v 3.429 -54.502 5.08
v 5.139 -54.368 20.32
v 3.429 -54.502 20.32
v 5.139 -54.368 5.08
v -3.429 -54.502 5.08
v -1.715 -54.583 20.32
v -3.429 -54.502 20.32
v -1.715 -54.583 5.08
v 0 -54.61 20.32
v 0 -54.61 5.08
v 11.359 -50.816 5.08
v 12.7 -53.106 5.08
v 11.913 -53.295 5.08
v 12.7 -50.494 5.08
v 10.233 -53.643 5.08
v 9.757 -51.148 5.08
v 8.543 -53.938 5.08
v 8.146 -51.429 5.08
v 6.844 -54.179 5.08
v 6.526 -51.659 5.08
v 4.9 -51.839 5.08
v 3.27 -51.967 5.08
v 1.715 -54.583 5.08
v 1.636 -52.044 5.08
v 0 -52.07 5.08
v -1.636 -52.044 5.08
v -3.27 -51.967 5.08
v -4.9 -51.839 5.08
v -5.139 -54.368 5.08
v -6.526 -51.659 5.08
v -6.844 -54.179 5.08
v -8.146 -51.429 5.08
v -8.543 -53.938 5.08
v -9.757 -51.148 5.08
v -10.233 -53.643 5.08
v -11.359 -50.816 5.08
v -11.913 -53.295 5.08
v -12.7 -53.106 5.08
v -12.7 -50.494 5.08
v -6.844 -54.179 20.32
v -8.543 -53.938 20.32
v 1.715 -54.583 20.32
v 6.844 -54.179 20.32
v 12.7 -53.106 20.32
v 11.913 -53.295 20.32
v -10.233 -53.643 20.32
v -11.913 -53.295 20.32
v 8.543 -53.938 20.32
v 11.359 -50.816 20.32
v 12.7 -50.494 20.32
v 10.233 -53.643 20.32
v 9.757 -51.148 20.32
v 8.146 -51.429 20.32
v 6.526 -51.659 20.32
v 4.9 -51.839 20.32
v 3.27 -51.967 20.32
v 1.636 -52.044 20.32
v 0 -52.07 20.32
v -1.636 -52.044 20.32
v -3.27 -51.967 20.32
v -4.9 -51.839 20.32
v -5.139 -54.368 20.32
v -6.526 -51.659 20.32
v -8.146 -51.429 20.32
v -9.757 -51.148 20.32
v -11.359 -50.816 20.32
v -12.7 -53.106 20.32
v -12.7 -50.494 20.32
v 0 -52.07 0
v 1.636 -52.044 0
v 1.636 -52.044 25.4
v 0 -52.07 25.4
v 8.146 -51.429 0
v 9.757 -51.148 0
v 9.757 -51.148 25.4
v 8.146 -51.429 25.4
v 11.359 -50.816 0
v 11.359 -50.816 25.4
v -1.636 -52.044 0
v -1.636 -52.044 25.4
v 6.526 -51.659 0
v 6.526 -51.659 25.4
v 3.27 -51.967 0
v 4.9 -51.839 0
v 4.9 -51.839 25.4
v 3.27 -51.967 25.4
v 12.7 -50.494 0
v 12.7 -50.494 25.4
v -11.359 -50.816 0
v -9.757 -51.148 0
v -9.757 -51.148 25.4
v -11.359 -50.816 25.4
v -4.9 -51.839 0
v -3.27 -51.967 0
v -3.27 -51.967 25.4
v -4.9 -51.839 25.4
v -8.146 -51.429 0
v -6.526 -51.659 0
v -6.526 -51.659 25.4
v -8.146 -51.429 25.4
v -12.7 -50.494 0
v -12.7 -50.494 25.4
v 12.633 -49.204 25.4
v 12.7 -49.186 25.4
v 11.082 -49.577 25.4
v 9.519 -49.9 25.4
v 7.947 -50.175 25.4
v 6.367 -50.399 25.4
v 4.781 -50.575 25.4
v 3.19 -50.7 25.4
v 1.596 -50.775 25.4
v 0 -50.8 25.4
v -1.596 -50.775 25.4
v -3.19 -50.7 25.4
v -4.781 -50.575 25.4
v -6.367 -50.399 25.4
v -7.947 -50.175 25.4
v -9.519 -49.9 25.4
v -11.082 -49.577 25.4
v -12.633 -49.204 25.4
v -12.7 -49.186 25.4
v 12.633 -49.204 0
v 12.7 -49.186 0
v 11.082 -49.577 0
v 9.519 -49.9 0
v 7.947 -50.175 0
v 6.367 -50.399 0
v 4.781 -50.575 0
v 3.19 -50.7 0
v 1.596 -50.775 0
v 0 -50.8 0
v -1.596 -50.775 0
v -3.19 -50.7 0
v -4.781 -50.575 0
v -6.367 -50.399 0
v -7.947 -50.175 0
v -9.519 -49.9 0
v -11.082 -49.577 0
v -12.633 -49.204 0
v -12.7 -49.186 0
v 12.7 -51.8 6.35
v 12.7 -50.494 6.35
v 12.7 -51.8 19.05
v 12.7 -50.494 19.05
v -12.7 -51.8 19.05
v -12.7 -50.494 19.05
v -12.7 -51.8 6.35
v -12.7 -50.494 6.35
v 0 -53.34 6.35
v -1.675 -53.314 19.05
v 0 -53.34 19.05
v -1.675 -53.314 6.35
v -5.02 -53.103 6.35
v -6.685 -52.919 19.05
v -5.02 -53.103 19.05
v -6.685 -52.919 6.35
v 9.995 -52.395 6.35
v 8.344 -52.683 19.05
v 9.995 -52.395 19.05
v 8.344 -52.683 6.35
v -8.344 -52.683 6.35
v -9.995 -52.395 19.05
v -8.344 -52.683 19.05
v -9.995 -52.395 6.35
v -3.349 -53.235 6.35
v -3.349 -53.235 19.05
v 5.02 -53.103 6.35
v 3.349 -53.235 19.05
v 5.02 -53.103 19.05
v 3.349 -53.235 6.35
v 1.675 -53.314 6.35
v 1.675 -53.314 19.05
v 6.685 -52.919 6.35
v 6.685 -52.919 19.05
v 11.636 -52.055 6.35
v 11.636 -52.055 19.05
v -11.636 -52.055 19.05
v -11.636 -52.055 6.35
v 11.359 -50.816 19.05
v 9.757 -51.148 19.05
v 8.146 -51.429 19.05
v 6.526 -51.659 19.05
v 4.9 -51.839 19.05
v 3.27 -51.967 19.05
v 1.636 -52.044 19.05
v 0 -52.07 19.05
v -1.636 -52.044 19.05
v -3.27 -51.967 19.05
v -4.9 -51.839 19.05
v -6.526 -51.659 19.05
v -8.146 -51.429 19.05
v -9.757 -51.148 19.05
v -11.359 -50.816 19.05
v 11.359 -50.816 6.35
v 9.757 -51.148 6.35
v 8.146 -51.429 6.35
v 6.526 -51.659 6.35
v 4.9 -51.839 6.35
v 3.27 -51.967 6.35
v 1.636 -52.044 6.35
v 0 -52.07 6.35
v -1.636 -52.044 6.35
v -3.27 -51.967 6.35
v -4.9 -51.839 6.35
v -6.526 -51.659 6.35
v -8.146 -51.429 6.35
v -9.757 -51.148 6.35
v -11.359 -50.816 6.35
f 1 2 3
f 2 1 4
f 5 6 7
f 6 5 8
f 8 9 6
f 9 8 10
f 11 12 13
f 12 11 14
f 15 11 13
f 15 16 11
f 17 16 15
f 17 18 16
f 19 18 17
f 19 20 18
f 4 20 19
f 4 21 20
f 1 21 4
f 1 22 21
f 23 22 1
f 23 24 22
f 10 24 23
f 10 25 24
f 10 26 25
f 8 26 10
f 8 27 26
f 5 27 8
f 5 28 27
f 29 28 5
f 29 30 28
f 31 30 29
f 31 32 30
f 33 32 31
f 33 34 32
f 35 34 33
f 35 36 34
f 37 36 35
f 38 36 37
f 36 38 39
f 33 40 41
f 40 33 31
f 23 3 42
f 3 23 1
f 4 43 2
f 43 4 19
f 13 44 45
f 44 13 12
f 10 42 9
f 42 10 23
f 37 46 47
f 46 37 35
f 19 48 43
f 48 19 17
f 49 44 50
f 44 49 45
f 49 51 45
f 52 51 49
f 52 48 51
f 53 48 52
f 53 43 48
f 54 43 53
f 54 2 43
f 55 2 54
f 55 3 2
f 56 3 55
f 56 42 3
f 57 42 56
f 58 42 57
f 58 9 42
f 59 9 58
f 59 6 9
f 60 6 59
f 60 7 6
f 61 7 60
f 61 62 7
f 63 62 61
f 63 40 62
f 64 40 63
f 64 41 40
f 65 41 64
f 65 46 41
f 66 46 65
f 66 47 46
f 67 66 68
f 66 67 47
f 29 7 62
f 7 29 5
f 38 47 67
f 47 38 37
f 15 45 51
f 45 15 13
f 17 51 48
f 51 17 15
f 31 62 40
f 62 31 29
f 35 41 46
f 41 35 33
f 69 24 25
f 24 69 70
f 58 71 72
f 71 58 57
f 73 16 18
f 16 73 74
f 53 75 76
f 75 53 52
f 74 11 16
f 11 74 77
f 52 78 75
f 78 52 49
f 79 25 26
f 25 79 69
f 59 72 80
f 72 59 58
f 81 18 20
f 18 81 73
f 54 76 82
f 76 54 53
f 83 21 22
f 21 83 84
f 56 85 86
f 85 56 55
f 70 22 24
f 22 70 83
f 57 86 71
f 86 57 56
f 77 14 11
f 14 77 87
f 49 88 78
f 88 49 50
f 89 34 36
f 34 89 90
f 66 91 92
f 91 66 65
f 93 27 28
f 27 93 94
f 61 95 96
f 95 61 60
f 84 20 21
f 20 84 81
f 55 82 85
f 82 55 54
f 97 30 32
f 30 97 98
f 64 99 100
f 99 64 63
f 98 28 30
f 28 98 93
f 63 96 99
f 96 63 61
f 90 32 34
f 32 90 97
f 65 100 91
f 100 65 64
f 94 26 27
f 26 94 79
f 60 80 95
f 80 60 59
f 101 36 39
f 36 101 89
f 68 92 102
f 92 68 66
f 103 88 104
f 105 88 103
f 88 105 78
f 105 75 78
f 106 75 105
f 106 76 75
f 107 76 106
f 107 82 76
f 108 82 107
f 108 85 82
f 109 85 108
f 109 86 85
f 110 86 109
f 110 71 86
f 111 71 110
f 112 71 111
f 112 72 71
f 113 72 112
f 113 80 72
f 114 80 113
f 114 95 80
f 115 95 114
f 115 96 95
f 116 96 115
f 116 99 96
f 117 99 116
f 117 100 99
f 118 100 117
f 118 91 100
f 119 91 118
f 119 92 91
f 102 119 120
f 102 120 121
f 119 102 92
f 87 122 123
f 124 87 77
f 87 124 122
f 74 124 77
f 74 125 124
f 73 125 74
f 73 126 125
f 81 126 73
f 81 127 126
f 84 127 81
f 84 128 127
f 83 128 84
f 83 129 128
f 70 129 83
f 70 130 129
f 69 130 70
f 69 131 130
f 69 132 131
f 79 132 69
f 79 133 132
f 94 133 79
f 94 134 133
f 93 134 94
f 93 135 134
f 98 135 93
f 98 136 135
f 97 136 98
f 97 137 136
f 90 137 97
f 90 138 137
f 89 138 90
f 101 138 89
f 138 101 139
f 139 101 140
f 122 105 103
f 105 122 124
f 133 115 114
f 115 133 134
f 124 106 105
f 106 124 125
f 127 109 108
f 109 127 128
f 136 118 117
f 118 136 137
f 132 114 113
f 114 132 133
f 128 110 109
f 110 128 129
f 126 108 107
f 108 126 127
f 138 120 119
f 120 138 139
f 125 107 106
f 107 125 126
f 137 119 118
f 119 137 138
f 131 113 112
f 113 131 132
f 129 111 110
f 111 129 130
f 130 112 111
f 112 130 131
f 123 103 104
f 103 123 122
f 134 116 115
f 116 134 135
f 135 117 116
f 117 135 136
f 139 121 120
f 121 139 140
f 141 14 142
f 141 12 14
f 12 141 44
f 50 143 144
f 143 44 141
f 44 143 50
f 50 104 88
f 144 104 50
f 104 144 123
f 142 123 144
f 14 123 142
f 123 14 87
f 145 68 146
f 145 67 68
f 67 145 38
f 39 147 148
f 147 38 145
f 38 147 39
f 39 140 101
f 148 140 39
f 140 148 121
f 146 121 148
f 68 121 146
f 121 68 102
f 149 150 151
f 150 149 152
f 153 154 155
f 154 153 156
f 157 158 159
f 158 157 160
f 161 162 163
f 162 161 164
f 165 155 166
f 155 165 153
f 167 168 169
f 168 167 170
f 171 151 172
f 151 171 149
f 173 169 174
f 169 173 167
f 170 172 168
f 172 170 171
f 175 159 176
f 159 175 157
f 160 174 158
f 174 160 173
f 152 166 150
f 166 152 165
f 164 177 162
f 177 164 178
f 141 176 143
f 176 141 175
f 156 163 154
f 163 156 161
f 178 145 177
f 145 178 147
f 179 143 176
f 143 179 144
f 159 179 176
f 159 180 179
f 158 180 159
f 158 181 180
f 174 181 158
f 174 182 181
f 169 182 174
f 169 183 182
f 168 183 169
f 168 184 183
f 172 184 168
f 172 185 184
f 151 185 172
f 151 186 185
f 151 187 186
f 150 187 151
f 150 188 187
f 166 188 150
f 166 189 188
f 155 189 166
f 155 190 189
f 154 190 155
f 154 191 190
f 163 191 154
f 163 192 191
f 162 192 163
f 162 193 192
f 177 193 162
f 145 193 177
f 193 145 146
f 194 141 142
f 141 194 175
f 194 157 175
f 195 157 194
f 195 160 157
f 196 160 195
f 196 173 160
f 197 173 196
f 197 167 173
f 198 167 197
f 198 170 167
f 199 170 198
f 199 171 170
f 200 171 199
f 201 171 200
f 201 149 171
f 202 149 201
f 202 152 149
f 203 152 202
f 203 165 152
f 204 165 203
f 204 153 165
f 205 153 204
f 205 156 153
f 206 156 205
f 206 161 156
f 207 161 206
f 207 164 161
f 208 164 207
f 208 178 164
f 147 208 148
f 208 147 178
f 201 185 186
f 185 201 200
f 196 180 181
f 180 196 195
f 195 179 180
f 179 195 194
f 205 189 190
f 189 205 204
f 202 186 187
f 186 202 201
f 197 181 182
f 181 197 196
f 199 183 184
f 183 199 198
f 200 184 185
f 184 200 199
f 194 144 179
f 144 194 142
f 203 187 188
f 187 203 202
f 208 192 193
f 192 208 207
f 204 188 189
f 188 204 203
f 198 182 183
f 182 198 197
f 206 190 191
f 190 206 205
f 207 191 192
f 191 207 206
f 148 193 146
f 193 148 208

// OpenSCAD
$fn=200;



difference() {
    difference() {
        union() {
            translate([0,0,in2mm(0.2)]) difference() {
                cylinder(h=in2mm(0.6), d=in2mm(4.3));
                translate([0,0,-11]) cylinder(h=in2mm(1.5), d=in2mm(4.1));
            }
            difference() {
                cylinder(h=in2mm(1), d=in2mm(4.1));
                translate([0,0,-11]) cylinder(h=in2mm(1.5), d=in2mm(4));
            }
        }
        translate([0,0,-1]) union() {
            translate([in2mm(0.5), in2mm(-4.5/2), 0]) cube([in2mm(4.5), in2mm(4.5),in2mm(1.2)]);
            translate([-in2mm(4.5)-in2mm(0.5), in2mm(-4.5/2), 0]) cube([in2mm(4.5), in2mm(4.5),in2mm(1.2)]);
            translate([-in2mm(1), -in2mm(1), 0]) cube([in2mm(4.5), in2mm(4.5),in2mm(1.2)]);
        }
    }
    translate([0,0,in2mm(0.25)]) difference() {
        cylinder(h=in2mm(0.5), d=in2mm(4.2));
        translate([0,0,-11]) cylinder(h=in2mm(1.5), d=in2mm(4.1));
    }
}


function in2mm(value) = value*25.4;
